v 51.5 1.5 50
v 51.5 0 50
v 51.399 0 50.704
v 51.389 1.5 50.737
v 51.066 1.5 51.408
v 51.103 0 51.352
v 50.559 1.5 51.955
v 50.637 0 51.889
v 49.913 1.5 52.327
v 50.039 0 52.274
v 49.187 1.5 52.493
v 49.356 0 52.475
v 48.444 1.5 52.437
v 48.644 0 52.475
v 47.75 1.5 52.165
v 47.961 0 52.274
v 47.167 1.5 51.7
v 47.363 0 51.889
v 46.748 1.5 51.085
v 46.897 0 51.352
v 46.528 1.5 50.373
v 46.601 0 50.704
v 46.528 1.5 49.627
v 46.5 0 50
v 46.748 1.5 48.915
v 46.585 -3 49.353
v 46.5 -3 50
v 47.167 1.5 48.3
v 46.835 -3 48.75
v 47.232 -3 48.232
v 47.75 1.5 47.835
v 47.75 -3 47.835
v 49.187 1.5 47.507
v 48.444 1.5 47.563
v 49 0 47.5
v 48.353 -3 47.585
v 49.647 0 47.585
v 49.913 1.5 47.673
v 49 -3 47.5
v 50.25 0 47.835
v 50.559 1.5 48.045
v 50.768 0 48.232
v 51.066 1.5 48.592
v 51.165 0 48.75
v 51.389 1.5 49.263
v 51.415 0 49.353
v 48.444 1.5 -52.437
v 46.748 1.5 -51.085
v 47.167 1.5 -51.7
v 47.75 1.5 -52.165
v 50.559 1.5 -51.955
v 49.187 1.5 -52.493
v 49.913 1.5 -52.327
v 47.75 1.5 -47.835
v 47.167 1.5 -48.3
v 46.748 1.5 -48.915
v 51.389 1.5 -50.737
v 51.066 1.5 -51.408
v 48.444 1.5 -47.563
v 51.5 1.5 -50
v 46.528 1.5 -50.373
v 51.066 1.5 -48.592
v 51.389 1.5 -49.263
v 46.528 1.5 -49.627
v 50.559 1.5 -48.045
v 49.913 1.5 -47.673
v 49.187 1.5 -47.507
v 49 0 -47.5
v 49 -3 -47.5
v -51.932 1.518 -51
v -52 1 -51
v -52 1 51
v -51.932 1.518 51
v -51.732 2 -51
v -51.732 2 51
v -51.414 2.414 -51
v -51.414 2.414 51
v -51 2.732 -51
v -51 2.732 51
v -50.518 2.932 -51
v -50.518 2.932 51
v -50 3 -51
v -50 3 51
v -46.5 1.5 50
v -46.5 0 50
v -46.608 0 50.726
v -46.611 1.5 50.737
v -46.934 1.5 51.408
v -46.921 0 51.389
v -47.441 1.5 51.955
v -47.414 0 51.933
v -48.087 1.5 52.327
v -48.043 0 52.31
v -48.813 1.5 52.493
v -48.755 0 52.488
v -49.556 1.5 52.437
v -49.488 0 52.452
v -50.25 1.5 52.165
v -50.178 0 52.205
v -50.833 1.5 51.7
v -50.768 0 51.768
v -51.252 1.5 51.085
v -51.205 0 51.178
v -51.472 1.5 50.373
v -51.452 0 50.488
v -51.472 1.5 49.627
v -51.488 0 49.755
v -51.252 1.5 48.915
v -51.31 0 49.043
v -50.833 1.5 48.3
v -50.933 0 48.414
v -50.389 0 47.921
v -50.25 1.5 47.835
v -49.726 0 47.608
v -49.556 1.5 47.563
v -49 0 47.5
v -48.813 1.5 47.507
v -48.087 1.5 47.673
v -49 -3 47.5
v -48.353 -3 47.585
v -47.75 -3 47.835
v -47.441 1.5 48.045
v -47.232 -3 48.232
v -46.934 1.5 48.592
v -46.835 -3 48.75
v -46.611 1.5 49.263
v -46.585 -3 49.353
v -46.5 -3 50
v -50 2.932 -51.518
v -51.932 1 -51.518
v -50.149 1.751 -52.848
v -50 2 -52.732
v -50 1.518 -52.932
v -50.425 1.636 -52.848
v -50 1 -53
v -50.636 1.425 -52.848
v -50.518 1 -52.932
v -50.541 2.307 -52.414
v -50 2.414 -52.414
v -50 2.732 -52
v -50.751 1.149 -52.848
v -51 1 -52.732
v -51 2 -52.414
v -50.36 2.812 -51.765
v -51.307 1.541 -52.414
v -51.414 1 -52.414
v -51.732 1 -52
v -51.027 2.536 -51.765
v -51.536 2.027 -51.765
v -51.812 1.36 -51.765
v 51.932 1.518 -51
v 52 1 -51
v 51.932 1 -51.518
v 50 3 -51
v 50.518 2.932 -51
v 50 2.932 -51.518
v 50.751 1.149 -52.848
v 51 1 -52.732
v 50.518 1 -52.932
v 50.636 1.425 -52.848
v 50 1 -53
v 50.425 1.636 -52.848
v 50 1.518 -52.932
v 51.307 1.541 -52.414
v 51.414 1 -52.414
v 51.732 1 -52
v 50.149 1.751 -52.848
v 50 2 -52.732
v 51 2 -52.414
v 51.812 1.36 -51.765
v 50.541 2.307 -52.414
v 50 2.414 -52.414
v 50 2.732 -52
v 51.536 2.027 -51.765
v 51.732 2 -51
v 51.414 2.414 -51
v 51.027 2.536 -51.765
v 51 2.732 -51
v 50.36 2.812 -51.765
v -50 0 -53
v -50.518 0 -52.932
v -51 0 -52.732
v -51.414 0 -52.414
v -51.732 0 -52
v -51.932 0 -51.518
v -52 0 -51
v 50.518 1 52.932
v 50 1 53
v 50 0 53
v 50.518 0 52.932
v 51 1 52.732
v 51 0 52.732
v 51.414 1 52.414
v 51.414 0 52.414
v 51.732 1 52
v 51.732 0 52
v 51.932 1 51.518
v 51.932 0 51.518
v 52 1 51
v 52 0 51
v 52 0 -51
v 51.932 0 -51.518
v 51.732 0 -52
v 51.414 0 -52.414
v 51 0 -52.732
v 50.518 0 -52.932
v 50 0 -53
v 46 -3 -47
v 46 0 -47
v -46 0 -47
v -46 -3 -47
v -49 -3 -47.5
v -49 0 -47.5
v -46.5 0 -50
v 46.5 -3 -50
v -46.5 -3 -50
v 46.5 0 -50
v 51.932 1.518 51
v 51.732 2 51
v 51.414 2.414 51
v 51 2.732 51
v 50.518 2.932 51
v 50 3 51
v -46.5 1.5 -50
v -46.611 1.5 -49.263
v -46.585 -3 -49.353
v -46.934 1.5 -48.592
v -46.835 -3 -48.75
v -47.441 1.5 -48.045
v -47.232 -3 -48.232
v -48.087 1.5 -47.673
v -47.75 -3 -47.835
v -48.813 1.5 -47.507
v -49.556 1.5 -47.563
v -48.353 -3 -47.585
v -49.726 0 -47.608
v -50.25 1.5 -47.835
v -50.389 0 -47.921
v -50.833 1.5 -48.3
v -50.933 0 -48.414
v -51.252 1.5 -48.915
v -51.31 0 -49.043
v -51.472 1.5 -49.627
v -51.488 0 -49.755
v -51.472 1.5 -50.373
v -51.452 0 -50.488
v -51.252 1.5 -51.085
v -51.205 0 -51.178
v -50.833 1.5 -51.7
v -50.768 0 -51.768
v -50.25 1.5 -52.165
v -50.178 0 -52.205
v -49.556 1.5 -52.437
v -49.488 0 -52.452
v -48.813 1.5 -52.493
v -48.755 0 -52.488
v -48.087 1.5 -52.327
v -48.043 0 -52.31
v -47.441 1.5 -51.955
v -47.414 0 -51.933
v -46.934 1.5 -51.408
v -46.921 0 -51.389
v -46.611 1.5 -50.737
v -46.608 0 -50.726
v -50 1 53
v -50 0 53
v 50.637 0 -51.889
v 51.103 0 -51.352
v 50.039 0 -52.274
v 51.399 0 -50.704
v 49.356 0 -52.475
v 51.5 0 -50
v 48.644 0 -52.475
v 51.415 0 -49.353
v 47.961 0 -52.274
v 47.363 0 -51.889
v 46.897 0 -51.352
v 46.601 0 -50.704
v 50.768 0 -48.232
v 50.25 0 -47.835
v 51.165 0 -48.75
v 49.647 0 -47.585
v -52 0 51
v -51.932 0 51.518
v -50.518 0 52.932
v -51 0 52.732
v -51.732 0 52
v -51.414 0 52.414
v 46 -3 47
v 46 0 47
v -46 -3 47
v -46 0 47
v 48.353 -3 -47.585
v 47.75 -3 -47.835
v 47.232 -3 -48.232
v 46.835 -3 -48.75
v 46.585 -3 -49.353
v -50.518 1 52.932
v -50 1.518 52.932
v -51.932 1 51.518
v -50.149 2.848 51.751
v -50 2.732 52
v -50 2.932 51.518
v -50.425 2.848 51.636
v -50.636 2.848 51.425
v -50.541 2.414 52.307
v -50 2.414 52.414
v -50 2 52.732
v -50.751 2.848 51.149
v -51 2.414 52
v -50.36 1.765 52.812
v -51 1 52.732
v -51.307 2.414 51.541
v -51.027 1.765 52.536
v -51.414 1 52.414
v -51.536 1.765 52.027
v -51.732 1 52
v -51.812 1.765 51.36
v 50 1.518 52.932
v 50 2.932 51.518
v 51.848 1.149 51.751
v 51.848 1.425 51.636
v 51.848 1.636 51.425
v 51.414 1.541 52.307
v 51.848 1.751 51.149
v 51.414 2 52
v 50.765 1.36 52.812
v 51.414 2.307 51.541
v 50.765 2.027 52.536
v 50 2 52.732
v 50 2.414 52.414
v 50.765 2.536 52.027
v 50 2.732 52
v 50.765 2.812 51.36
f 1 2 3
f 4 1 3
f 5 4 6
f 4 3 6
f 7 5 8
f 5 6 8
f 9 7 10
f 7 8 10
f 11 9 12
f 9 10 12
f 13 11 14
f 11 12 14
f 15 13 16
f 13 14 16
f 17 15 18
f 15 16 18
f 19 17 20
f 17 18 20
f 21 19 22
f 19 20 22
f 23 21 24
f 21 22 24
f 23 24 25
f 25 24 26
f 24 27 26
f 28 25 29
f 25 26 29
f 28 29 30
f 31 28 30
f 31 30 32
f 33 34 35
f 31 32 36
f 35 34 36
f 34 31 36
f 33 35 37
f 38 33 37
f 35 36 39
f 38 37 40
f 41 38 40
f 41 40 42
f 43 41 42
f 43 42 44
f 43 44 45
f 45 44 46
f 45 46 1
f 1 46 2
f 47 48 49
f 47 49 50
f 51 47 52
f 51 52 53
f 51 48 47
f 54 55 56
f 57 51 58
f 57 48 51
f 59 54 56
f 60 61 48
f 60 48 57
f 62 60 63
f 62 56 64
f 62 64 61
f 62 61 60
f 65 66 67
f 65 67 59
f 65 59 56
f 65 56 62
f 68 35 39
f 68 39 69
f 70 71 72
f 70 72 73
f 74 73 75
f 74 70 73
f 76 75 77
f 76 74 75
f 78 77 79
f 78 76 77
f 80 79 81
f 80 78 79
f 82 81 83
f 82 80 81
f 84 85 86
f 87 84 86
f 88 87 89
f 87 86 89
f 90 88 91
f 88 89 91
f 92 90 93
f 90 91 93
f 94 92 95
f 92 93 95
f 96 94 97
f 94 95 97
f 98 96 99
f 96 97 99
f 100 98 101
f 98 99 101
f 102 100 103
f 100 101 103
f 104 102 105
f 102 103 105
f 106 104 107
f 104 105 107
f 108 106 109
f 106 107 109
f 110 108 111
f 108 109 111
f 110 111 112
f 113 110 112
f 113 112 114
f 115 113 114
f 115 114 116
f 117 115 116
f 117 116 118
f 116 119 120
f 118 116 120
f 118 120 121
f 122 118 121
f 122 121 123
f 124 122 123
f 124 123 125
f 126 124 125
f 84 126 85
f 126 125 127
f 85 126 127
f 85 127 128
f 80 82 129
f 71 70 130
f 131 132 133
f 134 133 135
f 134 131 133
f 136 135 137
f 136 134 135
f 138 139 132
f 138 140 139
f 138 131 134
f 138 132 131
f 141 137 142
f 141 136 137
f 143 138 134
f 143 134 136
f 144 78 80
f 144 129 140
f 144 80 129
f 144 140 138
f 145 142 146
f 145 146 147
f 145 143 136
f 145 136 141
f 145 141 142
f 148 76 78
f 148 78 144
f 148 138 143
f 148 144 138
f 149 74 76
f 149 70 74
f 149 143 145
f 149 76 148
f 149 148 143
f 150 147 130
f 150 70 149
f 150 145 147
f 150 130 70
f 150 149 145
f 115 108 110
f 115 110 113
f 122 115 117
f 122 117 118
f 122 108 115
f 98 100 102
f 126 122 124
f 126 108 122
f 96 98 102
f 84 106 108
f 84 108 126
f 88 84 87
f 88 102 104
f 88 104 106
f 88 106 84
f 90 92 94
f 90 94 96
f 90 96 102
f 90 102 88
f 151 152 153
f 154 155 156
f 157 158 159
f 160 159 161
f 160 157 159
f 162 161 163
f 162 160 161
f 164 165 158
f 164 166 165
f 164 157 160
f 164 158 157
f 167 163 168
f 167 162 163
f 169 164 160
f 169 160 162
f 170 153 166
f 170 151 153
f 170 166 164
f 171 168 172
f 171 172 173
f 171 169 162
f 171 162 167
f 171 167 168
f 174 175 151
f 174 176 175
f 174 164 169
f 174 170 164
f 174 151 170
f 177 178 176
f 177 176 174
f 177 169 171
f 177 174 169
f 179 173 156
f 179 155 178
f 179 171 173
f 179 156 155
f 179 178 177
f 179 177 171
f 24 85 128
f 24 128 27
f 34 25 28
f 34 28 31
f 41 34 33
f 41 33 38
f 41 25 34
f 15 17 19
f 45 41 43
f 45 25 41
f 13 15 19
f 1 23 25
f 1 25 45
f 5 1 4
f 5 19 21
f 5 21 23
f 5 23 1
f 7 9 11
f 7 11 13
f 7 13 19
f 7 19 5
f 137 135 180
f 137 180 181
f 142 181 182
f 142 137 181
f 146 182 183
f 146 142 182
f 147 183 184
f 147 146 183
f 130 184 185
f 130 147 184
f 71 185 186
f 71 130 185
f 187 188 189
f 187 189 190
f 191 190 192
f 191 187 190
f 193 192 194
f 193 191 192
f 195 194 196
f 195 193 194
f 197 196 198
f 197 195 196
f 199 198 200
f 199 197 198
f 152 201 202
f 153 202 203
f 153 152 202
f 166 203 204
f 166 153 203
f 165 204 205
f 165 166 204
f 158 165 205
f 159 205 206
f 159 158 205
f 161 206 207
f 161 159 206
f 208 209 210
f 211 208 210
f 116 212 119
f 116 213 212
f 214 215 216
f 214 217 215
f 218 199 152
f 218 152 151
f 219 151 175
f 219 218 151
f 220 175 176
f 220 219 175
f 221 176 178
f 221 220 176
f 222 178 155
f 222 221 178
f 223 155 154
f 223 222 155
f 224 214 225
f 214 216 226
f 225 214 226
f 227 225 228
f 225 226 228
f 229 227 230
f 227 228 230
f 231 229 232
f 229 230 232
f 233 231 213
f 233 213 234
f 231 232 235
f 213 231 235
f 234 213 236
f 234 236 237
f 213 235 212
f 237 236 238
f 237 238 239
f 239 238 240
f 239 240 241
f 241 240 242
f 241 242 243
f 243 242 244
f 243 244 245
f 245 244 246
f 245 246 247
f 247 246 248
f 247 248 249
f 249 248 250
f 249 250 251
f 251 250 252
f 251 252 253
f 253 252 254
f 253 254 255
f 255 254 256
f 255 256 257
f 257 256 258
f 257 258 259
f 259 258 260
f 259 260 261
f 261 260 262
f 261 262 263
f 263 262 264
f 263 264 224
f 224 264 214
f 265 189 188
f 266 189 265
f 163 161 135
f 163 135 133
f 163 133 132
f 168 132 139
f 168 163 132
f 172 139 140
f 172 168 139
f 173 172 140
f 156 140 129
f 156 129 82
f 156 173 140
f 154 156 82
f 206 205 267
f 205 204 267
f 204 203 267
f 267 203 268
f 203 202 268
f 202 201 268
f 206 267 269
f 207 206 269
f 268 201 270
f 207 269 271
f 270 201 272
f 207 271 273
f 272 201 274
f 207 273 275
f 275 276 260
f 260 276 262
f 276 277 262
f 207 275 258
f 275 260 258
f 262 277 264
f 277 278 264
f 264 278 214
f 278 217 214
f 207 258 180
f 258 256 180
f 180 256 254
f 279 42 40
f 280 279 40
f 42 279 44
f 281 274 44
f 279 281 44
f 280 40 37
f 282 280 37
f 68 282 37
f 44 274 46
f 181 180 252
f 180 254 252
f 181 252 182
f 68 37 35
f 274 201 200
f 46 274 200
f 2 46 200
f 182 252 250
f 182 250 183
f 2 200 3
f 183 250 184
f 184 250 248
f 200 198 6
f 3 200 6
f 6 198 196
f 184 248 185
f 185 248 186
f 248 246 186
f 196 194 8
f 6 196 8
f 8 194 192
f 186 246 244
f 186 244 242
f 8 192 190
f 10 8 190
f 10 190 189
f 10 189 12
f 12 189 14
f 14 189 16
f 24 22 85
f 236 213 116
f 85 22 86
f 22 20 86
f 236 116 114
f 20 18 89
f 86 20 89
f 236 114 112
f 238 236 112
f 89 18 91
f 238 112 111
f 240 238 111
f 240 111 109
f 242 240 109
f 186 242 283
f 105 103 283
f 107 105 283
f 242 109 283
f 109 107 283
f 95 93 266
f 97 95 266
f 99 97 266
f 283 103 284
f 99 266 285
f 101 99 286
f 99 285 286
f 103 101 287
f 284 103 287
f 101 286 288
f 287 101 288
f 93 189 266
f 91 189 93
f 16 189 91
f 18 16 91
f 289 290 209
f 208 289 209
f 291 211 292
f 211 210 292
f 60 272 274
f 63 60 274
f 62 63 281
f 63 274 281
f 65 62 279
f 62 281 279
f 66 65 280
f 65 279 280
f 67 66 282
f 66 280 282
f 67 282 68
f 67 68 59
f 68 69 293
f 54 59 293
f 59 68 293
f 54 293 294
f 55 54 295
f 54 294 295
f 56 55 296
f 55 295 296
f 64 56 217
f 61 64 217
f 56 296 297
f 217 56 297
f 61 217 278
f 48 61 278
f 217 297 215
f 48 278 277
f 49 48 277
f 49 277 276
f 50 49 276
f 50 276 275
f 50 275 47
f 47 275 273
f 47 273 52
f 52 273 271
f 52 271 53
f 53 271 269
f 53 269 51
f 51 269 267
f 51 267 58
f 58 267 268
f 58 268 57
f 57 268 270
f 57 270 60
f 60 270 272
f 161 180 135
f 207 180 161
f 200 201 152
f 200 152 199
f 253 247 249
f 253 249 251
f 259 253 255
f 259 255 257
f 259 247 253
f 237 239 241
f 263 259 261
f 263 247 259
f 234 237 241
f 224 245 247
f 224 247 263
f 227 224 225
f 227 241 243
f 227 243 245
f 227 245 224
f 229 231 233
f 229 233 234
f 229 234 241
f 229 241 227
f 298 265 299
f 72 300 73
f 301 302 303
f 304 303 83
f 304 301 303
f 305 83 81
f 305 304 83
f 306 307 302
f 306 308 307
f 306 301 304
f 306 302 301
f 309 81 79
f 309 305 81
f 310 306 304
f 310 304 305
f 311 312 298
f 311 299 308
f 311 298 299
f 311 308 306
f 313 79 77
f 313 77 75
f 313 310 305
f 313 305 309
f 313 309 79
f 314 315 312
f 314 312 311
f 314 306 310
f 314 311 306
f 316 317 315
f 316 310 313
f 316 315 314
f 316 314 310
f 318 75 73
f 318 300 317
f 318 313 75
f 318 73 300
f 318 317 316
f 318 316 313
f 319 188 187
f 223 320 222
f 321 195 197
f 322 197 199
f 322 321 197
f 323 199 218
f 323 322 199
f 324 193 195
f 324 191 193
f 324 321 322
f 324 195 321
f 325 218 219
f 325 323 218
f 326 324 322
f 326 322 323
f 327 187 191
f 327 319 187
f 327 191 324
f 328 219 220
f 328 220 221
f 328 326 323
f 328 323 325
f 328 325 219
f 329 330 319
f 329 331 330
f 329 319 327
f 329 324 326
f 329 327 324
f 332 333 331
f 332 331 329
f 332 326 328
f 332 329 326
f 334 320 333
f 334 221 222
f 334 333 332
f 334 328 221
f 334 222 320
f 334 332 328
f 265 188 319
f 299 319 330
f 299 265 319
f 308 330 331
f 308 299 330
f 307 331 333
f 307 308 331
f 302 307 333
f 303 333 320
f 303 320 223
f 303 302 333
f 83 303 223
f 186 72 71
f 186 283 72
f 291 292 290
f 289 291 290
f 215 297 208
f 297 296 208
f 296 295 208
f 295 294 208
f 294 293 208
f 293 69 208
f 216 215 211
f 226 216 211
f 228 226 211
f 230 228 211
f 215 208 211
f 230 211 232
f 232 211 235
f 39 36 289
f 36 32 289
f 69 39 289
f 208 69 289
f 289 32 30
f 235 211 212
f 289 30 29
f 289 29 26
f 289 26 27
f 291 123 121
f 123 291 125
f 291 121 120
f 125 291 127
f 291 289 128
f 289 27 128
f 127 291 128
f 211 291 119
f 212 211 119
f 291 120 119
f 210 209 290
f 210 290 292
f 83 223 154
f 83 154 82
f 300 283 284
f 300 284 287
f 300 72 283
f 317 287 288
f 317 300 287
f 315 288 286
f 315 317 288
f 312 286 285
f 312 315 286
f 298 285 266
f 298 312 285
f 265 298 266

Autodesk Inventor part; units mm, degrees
ref_plane "YZ Plane" through (0, 0, 0) normal (1, 0, 0) x (0, 1, 0)
ref_plane "XZ Plane" through (0, 0, 0) normal (0, 1, 0) x (-1, 0, 0)
ref_plane "XY Plane" through (0, 0, 0) normal (0, 0, 1) x (1, 0, 0)
sketch "Sketch1" plane through (0, 0, 0) normal (0, 1, 0) x (-1, 0, 0)
  line L0 (49, 50) -> (-49, 50)
  line L1 (-49, 50) -> (-49, -50)
  line L2 (-49, -50) -> (49, -50)
  line L3 (49, -50) -> (49, 50)
  line L4 (49, 50) -> (-49, -50) construction
  line L5 (-49, 50) -> (49, -50) construction
  line L6 (52, -53) -> (-52, -53)
  line L7 (-52, -53) -> (-52, 53)
  line L8 (-52, 53) -> (52, 53)
  line L9 (52, 53) -> (52, -53)
  line L10 (46, 47) -> (-46, 47)
  line L11 (-46, 47) -> (-46, -47)
  line L12 (-46, -47) -> (46, -47)
  line L13 (46, -47) -> (46, 47)
  point P0 (0, 0)
  dimension "d0" = 98
  dimension "d1" = 100
  dimension "d2" = 3
  dimension "d3" = 3
extrude "Extrusion1" add sketch "Sketch1" along normal blind 3 contours L3 L2 L1 L0 | L6 L7 L8 L9 | L13 L12 L11 L10
extrude "Extrusion2" add sketch "Sketch1" against normal blind 3 contours L3 L2 L1 L0
sketch "Sketch2" plane through (0, -3, 0) normal (0, -1, 0) x (1, 0, 0)
  line L0 (-49, -50) -> (49, -50) projected
  circle A0 centre (49, -50) radius 2.5
  circle A1 centre (-49, -50) radius 2.5
  line L1 (49, 50) -> (49, -50) projected
  circle A2 centre (49, 50) radius 2.5
  line L2 (49, 50) -> (-49, 50) projected
  circle A3 centre (-49, 50) radius 2.5
  point P0 (0, 0)
  dimension "d8" = 5
  dimension "d9" = 5
  dimension "d10" = 5
  dimension "d12" = 5
extrude "Extrusion3" cut sketch "Sketch2" against normal blind 4.5
fillet "Fillet1" radius 2 8 edges at (-52, 1.5, 53) (0, 3, 53) (-52, 3, 0) (52, 1.5, 53) (52, 3, 0) (52, 1.5, -53) (0, 3, -53) (-52, 1.5, -53)
properties part number "Lid"
